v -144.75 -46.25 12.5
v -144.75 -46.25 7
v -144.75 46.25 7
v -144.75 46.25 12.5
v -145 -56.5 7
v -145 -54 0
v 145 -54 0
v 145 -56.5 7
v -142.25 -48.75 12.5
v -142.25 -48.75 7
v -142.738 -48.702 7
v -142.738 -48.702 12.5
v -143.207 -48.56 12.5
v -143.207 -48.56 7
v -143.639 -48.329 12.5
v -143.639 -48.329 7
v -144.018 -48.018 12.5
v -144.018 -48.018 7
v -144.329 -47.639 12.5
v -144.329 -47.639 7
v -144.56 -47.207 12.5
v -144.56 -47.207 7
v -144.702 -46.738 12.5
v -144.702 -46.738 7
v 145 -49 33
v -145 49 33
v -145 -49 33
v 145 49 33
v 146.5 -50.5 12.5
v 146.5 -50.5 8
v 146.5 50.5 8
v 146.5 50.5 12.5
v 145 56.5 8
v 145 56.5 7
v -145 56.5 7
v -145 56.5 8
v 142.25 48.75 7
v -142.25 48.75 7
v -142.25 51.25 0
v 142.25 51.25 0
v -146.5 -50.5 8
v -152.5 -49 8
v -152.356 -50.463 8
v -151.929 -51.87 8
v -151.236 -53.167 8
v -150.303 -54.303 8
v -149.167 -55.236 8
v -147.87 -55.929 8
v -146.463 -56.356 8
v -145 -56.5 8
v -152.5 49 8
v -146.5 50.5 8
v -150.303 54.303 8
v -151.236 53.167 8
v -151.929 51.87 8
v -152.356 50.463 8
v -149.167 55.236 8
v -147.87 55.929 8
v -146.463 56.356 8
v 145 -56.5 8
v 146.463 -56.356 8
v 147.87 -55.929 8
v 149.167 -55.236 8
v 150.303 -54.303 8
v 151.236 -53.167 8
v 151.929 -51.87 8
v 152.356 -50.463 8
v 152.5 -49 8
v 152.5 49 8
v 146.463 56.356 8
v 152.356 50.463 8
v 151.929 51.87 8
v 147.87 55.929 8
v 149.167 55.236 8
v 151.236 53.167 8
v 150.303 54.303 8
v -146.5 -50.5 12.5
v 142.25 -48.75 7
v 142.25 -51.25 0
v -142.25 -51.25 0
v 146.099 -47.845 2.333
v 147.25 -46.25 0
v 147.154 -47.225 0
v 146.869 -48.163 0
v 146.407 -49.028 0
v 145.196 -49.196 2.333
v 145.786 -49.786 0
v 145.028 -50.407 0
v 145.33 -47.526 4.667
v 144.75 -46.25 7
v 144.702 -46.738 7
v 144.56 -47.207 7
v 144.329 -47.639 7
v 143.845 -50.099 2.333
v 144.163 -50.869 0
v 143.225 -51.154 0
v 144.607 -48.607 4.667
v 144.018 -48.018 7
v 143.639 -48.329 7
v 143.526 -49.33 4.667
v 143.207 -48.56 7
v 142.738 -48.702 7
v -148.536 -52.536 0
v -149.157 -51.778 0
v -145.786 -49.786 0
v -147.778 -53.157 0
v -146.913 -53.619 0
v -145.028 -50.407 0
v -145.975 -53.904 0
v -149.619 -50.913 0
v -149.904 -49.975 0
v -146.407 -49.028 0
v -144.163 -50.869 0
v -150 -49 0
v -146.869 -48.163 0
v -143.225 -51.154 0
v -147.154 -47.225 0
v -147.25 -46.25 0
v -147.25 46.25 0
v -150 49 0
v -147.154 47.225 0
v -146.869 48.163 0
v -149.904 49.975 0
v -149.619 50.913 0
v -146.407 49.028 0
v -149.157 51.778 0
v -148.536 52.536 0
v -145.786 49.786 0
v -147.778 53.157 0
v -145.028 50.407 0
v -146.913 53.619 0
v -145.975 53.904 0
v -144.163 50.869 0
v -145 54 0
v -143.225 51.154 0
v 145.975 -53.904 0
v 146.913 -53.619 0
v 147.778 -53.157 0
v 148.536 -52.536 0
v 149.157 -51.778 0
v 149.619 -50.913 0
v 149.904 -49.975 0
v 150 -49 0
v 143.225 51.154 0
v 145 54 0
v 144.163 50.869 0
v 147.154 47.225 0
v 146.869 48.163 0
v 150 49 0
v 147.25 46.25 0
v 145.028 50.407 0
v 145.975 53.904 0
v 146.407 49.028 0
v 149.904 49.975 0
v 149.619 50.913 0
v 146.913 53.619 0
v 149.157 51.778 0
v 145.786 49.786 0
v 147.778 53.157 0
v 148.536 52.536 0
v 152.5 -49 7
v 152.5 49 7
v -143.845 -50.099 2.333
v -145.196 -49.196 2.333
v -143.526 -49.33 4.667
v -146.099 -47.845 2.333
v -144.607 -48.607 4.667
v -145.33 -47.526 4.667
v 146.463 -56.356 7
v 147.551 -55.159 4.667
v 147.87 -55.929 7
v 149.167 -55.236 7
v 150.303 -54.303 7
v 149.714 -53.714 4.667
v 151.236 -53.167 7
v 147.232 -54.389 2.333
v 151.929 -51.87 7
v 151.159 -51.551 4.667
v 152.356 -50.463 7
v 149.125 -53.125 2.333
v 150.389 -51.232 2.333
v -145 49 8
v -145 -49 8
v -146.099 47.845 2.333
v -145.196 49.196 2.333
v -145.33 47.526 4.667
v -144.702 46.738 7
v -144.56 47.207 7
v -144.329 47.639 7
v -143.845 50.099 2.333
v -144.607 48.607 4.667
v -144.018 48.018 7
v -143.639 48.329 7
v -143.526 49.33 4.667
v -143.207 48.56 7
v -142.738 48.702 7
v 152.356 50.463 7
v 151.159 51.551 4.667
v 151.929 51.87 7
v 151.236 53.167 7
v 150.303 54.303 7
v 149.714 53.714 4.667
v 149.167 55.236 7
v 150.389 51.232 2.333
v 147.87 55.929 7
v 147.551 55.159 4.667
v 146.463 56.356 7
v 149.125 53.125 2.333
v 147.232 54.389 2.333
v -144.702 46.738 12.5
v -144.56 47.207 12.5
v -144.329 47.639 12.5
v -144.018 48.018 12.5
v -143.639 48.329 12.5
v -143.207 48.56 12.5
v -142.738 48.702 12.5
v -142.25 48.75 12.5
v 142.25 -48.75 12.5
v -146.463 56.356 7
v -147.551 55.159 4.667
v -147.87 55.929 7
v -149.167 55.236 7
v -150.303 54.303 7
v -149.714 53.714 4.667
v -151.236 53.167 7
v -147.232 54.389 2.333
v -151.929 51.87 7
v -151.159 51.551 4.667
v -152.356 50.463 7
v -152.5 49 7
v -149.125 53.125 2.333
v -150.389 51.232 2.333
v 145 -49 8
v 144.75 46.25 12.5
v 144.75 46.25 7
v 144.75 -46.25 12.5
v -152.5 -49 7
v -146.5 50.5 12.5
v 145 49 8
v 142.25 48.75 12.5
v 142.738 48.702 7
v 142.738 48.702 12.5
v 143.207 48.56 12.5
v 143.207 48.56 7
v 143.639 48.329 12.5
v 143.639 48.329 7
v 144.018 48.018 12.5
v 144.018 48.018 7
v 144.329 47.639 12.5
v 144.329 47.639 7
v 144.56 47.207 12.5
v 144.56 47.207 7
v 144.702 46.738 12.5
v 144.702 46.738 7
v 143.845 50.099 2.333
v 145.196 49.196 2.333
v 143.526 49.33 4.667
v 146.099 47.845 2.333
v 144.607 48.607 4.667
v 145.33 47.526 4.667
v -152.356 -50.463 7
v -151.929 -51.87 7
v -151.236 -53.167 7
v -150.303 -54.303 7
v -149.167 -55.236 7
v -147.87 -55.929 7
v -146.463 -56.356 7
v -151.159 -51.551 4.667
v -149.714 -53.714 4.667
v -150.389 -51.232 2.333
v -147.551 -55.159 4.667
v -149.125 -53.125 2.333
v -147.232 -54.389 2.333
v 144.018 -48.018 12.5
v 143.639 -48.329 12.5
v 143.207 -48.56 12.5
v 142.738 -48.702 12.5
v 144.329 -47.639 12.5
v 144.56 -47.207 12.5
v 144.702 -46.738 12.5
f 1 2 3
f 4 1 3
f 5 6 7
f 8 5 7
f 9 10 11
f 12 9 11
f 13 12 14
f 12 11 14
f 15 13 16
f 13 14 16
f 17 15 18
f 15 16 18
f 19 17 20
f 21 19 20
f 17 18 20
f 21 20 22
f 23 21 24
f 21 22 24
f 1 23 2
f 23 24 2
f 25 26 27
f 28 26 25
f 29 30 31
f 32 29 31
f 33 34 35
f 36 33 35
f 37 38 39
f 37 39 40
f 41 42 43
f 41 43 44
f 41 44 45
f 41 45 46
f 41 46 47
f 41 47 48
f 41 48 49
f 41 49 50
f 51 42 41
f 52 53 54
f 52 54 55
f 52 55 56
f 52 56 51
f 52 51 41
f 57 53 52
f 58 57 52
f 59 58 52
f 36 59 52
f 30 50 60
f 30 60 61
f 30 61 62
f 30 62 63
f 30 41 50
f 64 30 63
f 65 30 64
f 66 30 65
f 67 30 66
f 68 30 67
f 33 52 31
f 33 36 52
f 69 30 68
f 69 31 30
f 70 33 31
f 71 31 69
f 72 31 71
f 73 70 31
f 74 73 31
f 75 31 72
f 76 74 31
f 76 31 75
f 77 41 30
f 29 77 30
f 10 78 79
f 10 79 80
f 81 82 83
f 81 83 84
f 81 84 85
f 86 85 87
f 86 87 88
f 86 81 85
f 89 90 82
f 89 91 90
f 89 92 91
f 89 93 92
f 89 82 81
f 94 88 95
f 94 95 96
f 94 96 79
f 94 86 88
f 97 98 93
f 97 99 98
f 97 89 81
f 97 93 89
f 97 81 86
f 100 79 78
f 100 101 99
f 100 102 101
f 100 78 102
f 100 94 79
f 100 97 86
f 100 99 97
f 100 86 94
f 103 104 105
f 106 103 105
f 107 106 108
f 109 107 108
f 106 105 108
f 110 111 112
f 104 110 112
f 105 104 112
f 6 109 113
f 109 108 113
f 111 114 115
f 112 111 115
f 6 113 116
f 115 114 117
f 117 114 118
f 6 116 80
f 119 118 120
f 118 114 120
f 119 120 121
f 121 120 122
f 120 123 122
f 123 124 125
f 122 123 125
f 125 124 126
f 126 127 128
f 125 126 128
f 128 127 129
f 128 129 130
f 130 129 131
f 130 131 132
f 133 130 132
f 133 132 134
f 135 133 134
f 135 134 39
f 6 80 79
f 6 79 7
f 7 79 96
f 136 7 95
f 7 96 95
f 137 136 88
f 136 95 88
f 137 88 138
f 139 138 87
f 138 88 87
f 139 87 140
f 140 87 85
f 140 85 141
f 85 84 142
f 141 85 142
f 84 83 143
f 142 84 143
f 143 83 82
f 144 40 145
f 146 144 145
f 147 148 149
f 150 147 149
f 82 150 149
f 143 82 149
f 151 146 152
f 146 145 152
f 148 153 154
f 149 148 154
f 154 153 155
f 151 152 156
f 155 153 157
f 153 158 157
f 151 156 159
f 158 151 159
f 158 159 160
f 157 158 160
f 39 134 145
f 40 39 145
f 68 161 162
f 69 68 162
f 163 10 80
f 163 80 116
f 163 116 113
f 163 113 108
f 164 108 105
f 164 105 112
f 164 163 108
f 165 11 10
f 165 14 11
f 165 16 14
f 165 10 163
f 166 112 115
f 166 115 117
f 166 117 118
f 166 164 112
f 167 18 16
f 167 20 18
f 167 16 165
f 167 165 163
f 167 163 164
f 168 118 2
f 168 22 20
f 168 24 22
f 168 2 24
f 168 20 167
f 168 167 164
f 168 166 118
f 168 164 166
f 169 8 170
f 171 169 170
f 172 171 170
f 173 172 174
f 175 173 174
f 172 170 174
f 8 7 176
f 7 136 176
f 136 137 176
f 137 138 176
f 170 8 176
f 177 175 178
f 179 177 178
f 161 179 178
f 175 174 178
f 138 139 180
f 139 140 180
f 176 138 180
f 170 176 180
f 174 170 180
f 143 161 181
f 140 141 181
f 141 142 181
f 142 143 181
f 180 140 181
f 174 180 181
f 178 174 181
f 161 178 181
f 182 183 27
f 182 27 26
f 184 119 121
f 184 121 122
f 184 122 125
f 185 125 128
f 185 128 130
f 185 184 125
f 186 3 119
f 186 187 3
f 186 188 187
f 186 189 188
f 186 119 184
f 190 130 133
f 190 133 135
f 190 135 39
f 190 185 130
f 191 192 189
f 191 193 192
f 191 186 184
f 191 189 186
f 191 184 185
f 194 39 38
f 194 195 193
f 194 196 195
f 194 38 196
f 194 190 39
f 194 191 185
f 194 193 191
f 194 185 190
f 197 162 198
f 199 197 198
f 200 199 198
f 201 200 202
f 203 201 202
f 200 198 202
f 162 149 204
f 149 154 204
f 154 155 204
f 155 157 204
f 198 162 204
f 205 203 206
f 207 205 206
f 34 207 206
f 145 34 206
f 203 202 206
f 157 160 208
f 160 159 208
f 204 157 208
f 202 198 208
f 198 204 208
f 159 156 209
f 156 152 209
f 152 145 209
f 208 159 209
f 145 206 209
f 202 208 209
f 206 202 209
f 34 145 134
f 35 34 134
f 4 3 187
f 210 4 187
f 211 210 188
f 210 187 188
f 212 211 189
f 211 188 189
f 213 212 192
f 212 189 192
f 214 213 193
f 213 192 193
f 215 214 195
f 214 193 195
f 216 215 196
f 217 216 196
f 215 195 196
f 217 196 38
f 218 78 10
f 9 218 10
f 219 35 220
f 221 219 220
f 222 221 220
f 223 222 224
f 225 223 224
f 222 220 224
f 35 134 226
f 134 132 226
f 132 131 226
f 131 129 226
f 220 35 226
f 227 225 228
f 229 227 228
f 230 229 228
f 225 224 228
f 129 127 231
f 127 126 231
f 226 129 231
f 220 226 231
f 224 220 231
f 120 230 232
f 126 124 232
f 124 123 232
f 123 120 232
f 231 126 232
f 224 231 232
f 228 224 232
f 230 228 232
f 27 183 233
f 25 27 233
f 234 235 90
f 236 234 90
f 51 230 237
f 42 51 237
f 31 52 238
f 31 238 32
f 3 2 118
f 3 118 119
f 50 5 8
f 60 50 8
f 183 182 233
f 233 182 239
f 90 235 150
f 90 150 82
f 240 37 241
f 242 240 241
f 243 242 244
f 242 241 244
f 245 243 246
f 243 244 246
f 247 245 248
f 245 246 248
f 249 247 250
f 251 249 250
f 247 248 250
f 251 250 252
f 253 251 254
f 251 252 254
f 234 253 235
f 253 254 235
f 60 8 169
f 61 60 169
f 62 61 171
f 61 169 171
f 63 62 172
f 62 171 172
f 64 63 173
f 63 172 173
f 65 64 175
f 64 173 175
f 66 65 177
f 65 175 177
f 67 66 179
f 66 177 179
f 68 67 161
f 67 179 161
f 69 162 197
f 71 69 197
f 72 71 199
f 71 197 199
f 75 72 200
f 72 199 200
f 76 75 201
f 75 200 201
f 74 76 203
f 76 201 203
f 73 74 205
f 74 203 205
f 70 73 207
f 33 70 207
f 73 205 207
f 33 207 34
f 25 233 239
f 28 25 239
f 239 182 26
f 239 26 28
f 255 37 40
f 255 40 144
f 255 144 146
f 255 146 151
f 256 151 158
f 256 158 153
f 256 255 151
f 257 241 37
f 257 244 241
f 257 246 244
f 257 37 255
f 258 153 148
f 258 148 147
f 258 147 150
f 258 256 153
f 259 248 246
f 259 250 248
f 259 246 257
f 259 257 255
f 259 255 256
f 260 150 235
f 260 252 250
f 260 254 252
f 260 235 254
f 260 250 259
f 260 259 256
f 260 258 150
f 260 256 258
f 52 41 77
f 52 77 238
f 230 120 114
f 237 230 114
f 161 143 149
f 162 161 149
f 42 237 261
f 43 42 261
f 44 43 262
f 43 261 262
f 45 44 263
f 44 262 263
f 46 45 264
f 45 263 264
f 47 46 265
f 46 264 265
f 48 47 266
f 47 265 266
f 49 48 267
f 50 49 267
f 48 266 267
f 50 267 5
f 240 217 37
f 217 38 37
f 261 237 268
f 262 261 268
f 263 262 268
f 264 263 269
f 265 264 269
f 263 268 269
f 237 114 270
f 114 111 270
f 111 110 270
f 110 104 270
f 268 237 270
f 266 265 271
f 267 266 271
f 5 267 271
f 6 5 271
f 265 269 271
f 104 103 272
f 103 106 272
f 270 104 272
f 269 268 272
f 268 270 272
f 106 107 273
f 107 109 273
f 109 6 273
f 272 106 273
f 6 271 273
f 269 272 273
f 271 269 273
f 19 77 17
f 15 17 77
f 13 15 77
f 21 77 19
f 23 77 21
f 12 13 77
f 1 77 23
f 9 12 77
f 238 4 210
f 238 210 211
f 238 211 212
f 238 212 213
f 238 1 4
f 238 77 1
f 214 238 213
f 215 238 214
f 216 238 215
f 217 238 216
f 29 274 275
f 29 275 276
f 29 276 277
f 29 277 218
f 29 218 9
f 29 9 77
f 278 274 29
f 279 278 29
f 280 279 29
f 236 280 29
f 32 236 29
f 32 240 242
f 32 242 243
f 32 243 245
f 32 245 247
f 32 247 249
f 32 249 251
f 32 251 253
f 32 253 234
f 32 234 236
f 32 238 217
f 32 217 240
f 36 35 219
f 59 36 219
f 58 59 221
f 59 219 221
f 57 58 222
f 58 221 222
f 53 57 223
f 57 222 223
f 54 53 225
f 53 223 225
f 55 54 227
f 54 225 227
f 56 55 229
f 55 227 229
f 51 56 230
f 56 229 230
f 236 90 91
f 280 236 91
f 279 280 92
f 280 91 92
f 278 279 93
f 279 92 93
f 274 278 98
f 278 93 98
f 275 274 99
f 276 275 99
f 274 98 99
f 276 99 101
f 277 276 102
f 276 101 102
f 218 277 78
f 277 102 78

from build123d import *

# Parameters (mm, degrees)
F1_DEPTH = 8
F2_SIZE2 = 2.5
F2_SIZE  = 7
F3_SIZE2 = 7
F3_SIZE  = 2.5
F4_W     = 293
F4_H     = 101
F5_DEPTH = 4.5
F6_W     = 290
F6_H     = 98
F7_DEPTH = 25


with BuildPart() as f1:
    # F0 (on Top) → F1 (new body)
    with BuildSketch(Plane.XY):
        with BuildLine():
            Line((-145, -56.5), (145, -56.5))
            ThreePointArc((145, -56.5), (150.303301, -54.303301), (152.5, -49))
            Line((152.5, -49), (152.5, 49))
            ThreePointArc((152.5, 49), (150.303301, 54.303301), (145, 56.5))
            Line((145, 56.5), (-145, 56.5))
            ThreePointArc((-145, 56.5), (-150.303301, 54.303301), (-152.5, 49))
            Line((-152.5, 49), (-152.5, -49))
            ThreePointArc((-152.5, -49), (-150.303301, -54.303301), (-145, -56.5))
        make_face()
        with BuildLine():
            ThreePointArc((144.75, -46.25), (144.017767, -48.017767), (142.25, -48.75))
            Line((142.25, -48.75), (-142.25, -48.75))
            ThreePointArc((-142.25, -48.75), (-144.017767, -48.017767), (-144.75, -46.25))
            Line((-144.75, -46.25), (-144.75, 46.25))
            ThreePointArc((-144.75, 46.25), (-144.017767, 48.017767), (-142.25, 48.75))
            Line((-142.25, 48.75), (142.25, 48.75))
            ThreePointArc((142.25, 48.75), (144.017767, 48.017767), (144.75, 46.25))
            Line((144.75, 46.25), (144.75, -46.25))
        make_face(mode=Mode.SUBTRACT)
    extrude(amount=F1_DEPTH)

    # F2
    f2_edges = [f1.edges().sort_by_distance(p)[0] for p in [
        (0, 56.5, 0),
    ]]
    chamfer(f2_edges, length=F2_SIZE, length2=F2_SIZE2)

    # F3
    f3_edges = [f1.edges().sort_by_distance(p)[0] for p in [
        (0, 48.75, 0),
    ]]
    chamfer(f3_edges, length=F3_SIZE, length2=F3_SIZE2)

    # F4 (on face) → F5 (join)
    with BuildSketch(Plane.XY.offset(8)):
        Rectangle(F4_W, F4_H)
        with BuildLine():
            Line((-142.25, 48.75), (142.25, 48.75))
            ThreePointArc((142.25, 48.75), (144.017767, 48.017767), (144.75, 46.25))
            Line((144.75, 46.25), (144.75, -46.25))
            ThreePointArc((144.75, -46.25), (144.017767, -48.017767), (142.25, -48.75))
            Line((142.25, -48.75), (-142.25, -48.75))
            ThreePointArc((-142.25, -48.75), (-144.017767, -48.017767), (-144.75, -46.25))
            Line((-144.75, -46.25), (-144.75, 46.25))
            ThreePointArc((-144.75, 46.25), (-144.017767, 48.017767), (-142.25, 48.75))
        make_face(mode=Mode.SUBTRACT)
    extrude(amount=F5_DEPTH)


with BuildPart() as f7:
    # F6 (on face) → F7 (new body)
    with BuildSketch(Plane.XY.offset(8)):
        Rectangle(F6_W, F6_H)
    extrude(amount=F7_DEPTH)


solid = Compound([f1.part, f7.part])
